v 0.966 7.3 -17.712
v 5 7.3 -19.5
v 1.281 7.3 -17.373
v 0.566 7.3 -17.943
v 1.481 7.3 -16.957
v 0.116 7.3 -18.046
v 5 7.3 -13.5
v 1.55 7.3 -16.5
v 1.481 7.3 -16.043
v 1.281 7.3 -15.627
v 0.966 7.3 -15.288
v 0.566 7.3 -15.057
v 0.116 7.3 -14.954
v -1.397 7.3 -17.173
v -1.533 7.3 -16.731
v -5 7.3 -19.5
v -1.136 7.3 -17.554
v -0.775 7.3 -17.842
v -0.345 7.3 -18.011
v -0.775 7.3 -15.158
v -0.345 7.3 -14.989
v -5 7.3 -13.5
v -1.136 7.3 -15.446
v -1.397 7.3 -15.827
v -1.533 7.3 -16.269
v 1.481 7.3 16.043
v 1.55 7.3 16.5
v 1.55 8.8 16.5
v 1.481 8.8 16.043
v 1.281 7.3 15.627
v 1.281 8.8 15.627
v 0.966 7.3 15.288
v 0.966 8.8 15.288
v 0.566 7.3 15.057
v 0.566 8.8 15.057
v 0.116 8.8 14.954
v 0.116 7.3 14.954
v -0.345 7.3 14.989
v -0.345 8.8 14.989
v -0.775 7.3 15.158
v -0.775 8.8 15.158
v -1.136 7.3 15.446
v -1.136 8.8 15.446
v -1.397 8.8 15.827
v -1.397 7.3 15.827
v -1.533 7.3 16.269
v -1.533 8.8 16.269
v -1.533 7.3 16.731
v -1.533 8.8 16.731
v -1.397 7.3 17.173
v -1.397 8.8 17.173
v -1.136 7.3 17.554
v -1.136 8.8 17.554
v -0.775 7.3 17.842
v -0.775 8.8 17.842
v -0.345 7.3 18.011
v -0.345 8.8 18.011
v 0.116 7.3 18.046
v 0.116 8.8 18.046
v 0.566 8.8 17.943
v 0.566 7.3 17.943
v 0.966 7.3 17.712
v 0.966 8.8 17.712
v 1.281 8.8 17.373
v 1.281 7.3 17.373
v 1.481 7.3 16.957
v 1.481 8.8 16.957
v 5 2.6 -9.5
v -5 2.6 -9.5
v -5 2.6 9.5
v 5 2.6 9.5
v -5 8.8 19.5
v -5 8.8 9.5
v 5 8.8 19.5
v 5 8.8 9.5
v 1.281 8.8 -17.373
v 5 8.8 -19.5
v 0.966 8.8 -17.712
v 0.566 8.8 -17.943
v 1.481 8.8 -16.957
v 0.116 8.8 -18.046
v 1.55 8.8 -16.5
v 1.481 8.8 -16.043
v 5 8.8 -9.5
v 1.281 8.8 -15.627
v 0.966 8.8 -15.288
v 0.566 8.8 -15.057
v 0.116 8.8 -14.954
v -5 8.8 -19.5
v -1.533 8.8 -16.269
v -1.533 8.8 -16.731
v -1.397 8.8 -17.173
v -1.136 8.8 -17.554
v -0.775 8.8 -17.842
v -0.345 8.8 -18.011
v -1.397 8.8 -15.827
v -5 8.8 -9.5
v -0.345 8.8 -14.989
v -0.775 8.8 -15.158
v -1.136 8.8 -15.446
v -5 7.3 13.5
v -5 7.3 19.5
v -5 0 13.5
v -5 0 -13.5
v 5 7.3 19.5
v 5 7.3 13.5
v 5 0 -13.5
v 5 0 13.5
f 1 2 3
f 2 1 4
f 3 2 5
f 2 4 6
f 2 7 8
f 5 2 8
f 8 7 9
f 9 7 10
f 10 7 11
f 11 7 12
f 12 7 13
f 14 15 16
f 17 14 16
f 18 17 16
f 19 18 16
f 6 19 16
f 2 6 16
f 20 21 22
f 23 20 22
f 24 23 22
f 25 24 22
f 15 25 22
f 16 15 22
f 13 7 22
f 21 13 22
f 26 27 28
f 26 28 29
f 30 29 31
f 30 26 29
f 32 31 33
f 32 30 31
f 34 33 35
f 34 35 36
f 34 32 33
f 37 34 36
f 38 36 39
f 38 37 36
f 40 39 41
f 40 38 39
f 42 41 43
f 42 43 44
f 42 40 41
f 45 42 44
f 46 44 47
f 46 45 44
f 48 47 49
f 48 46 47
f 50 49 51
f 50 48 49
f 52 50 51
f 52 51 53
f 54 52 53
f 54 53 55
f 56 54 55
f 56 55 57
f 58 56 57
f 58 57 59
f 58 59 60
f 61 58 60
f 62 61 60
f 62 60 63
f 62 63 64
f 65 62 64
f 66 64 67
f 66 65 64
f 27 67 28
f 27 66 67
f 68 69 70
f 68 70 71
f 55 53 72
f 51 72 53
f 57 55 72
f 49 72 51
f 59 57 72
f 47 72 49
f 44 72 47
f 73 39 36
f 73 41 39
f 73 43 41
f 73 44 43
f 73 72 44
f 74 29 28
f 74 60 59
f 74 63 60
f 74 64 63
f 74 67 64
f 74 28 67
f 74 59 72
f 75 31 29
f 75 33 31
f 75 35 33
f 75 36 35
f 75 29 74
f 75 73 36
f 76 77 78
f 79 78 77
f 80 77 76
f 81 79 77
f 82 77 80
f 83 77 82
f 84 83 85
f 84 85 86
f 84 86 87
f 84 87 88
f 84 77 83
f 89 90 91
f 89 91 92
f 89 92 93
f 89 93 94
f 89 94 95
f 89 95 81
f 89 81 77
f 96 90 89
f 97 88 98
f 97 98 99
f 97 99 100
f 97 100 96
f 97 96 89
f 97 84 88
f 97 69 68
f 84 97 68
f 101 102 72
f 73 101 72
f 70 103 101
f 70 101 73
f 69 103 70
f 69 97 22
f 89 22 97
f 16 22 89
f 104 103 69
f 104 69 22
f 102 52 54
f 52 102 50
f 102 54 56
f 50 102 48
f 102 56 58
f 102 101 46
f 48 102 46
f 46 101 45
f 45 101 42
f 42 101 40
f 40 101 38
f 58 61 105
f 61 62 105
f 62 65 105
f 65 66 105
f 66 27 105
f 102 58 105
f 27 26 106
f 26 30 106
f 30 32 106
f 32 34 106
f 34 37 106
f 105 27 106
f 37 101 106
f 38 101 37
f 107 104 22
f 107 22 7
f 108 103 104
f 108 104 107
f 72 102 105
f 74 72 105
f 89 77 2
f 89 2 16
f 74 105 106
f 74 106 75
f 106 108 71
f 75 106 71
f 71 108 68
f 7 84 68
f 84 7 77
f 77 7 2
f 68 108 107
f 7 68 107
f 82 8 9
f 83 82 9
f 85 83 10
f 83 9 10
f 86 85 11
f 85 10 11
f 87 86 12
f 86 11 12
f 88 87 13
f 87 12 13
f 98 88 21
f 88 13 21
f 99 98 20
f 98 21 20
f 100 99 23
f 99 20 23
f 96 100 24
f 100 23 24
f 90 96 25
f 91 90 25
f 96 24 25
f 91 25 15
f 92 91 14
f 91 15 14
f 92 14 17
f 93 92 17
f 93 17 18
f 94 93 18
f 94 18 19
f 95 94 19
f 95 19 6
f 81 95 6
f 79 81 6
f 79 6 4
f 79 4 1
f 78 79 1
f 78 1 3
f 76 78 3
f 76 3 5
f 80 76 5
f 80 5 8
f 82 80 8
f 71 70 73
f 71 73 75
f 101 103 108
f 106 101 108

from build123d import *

# Parameters (mm, degrees)
CROQUIS1_W              = 10
CROQUIS1_H              = 27
SALIENTE_EXTRUIR1_DEPTH = 2.6
CROQUIS2_W              = 10
CROQUIS2_H              = 4
SALIENTE_EXTRUIR2_DEPTH = 6.2
CROQUIS3_W              = 10
CROQUIS3_H              = 1.5
SALIENTE_EXTRUIR3_DEPTH = 6
CROQUIS4_R              = 1.55
CORTAR_EXTRUIR1_DEPTH   = 5


with BuildPart() as part:
    # Croquis1 → Saliente-Extruir1 (new body)
    with BuildSketch(Plane(origin=(0, 0, 0), x_dir=(1, 0, 0), z_dir=(0, 1, 0))):
        Rectangle(CROQUIS1_W, CROQUIS1_H)
    saliente_extruir1 = extrude(amount=SALIENTE_EXTRUIR1_DEPTH)

    # Croquis2 → Saliente-Extruir2 (add)
    with BuildSketch(Plane(origin=(0, 2.6, 0), x_dir=(1, 0, 0), z_dir=(0, 1, 0))):
        with Locations((0, 11.5)):
            Rectangle(CROQUIS2_W, CROQUIS2_H)
    saliente_extruir2 = extrude(amount=SALIENTE_EXTRUIR2_DEPTH)

    # Croquis3 → Saliente-Extruir3 (add)
    with BuildSketch(Plane(origin=(0, 0, -13.5), x_dir=(-1, 0, 0), z_dir=(0, 0, -1))):
        with Locations((0, 8.05)):
            Rectangle(CROQUIS3_W, CROQUIS3_H)
    saliente_extruir3 = extrude(amount=SALIENTE_EXTRUIR3_DEPTH)

    # Croquis4 → Cortar-Extruir1 (cut)
    with BuildSketch(Plane.XZ.offset(-7.3)):
        with Locations((0, -16.5)):
            Circle(CROQUIS4_R)
    cortar_extruir1 = extrude(amount=-CORTAR_EXTRUIR1_DEPTH, mode=Mode.SUBTRACT)

    # Simetría1: Saliente-Extruir1, Saliente-Extruir2, Saliente-Extruir3, Cortar-Extruir1 across plane
    add(saliente_extruir1.mirror(Plane.XY))
    add(saliente_extruir2.mirror(Plane.XY))
    add(saliente_extruir3.mirror(Plane.XY))
    add(cortar_extruir1.mirror(Plane.XY), mode=Mode.SUBTRACT)


solid = part.part
